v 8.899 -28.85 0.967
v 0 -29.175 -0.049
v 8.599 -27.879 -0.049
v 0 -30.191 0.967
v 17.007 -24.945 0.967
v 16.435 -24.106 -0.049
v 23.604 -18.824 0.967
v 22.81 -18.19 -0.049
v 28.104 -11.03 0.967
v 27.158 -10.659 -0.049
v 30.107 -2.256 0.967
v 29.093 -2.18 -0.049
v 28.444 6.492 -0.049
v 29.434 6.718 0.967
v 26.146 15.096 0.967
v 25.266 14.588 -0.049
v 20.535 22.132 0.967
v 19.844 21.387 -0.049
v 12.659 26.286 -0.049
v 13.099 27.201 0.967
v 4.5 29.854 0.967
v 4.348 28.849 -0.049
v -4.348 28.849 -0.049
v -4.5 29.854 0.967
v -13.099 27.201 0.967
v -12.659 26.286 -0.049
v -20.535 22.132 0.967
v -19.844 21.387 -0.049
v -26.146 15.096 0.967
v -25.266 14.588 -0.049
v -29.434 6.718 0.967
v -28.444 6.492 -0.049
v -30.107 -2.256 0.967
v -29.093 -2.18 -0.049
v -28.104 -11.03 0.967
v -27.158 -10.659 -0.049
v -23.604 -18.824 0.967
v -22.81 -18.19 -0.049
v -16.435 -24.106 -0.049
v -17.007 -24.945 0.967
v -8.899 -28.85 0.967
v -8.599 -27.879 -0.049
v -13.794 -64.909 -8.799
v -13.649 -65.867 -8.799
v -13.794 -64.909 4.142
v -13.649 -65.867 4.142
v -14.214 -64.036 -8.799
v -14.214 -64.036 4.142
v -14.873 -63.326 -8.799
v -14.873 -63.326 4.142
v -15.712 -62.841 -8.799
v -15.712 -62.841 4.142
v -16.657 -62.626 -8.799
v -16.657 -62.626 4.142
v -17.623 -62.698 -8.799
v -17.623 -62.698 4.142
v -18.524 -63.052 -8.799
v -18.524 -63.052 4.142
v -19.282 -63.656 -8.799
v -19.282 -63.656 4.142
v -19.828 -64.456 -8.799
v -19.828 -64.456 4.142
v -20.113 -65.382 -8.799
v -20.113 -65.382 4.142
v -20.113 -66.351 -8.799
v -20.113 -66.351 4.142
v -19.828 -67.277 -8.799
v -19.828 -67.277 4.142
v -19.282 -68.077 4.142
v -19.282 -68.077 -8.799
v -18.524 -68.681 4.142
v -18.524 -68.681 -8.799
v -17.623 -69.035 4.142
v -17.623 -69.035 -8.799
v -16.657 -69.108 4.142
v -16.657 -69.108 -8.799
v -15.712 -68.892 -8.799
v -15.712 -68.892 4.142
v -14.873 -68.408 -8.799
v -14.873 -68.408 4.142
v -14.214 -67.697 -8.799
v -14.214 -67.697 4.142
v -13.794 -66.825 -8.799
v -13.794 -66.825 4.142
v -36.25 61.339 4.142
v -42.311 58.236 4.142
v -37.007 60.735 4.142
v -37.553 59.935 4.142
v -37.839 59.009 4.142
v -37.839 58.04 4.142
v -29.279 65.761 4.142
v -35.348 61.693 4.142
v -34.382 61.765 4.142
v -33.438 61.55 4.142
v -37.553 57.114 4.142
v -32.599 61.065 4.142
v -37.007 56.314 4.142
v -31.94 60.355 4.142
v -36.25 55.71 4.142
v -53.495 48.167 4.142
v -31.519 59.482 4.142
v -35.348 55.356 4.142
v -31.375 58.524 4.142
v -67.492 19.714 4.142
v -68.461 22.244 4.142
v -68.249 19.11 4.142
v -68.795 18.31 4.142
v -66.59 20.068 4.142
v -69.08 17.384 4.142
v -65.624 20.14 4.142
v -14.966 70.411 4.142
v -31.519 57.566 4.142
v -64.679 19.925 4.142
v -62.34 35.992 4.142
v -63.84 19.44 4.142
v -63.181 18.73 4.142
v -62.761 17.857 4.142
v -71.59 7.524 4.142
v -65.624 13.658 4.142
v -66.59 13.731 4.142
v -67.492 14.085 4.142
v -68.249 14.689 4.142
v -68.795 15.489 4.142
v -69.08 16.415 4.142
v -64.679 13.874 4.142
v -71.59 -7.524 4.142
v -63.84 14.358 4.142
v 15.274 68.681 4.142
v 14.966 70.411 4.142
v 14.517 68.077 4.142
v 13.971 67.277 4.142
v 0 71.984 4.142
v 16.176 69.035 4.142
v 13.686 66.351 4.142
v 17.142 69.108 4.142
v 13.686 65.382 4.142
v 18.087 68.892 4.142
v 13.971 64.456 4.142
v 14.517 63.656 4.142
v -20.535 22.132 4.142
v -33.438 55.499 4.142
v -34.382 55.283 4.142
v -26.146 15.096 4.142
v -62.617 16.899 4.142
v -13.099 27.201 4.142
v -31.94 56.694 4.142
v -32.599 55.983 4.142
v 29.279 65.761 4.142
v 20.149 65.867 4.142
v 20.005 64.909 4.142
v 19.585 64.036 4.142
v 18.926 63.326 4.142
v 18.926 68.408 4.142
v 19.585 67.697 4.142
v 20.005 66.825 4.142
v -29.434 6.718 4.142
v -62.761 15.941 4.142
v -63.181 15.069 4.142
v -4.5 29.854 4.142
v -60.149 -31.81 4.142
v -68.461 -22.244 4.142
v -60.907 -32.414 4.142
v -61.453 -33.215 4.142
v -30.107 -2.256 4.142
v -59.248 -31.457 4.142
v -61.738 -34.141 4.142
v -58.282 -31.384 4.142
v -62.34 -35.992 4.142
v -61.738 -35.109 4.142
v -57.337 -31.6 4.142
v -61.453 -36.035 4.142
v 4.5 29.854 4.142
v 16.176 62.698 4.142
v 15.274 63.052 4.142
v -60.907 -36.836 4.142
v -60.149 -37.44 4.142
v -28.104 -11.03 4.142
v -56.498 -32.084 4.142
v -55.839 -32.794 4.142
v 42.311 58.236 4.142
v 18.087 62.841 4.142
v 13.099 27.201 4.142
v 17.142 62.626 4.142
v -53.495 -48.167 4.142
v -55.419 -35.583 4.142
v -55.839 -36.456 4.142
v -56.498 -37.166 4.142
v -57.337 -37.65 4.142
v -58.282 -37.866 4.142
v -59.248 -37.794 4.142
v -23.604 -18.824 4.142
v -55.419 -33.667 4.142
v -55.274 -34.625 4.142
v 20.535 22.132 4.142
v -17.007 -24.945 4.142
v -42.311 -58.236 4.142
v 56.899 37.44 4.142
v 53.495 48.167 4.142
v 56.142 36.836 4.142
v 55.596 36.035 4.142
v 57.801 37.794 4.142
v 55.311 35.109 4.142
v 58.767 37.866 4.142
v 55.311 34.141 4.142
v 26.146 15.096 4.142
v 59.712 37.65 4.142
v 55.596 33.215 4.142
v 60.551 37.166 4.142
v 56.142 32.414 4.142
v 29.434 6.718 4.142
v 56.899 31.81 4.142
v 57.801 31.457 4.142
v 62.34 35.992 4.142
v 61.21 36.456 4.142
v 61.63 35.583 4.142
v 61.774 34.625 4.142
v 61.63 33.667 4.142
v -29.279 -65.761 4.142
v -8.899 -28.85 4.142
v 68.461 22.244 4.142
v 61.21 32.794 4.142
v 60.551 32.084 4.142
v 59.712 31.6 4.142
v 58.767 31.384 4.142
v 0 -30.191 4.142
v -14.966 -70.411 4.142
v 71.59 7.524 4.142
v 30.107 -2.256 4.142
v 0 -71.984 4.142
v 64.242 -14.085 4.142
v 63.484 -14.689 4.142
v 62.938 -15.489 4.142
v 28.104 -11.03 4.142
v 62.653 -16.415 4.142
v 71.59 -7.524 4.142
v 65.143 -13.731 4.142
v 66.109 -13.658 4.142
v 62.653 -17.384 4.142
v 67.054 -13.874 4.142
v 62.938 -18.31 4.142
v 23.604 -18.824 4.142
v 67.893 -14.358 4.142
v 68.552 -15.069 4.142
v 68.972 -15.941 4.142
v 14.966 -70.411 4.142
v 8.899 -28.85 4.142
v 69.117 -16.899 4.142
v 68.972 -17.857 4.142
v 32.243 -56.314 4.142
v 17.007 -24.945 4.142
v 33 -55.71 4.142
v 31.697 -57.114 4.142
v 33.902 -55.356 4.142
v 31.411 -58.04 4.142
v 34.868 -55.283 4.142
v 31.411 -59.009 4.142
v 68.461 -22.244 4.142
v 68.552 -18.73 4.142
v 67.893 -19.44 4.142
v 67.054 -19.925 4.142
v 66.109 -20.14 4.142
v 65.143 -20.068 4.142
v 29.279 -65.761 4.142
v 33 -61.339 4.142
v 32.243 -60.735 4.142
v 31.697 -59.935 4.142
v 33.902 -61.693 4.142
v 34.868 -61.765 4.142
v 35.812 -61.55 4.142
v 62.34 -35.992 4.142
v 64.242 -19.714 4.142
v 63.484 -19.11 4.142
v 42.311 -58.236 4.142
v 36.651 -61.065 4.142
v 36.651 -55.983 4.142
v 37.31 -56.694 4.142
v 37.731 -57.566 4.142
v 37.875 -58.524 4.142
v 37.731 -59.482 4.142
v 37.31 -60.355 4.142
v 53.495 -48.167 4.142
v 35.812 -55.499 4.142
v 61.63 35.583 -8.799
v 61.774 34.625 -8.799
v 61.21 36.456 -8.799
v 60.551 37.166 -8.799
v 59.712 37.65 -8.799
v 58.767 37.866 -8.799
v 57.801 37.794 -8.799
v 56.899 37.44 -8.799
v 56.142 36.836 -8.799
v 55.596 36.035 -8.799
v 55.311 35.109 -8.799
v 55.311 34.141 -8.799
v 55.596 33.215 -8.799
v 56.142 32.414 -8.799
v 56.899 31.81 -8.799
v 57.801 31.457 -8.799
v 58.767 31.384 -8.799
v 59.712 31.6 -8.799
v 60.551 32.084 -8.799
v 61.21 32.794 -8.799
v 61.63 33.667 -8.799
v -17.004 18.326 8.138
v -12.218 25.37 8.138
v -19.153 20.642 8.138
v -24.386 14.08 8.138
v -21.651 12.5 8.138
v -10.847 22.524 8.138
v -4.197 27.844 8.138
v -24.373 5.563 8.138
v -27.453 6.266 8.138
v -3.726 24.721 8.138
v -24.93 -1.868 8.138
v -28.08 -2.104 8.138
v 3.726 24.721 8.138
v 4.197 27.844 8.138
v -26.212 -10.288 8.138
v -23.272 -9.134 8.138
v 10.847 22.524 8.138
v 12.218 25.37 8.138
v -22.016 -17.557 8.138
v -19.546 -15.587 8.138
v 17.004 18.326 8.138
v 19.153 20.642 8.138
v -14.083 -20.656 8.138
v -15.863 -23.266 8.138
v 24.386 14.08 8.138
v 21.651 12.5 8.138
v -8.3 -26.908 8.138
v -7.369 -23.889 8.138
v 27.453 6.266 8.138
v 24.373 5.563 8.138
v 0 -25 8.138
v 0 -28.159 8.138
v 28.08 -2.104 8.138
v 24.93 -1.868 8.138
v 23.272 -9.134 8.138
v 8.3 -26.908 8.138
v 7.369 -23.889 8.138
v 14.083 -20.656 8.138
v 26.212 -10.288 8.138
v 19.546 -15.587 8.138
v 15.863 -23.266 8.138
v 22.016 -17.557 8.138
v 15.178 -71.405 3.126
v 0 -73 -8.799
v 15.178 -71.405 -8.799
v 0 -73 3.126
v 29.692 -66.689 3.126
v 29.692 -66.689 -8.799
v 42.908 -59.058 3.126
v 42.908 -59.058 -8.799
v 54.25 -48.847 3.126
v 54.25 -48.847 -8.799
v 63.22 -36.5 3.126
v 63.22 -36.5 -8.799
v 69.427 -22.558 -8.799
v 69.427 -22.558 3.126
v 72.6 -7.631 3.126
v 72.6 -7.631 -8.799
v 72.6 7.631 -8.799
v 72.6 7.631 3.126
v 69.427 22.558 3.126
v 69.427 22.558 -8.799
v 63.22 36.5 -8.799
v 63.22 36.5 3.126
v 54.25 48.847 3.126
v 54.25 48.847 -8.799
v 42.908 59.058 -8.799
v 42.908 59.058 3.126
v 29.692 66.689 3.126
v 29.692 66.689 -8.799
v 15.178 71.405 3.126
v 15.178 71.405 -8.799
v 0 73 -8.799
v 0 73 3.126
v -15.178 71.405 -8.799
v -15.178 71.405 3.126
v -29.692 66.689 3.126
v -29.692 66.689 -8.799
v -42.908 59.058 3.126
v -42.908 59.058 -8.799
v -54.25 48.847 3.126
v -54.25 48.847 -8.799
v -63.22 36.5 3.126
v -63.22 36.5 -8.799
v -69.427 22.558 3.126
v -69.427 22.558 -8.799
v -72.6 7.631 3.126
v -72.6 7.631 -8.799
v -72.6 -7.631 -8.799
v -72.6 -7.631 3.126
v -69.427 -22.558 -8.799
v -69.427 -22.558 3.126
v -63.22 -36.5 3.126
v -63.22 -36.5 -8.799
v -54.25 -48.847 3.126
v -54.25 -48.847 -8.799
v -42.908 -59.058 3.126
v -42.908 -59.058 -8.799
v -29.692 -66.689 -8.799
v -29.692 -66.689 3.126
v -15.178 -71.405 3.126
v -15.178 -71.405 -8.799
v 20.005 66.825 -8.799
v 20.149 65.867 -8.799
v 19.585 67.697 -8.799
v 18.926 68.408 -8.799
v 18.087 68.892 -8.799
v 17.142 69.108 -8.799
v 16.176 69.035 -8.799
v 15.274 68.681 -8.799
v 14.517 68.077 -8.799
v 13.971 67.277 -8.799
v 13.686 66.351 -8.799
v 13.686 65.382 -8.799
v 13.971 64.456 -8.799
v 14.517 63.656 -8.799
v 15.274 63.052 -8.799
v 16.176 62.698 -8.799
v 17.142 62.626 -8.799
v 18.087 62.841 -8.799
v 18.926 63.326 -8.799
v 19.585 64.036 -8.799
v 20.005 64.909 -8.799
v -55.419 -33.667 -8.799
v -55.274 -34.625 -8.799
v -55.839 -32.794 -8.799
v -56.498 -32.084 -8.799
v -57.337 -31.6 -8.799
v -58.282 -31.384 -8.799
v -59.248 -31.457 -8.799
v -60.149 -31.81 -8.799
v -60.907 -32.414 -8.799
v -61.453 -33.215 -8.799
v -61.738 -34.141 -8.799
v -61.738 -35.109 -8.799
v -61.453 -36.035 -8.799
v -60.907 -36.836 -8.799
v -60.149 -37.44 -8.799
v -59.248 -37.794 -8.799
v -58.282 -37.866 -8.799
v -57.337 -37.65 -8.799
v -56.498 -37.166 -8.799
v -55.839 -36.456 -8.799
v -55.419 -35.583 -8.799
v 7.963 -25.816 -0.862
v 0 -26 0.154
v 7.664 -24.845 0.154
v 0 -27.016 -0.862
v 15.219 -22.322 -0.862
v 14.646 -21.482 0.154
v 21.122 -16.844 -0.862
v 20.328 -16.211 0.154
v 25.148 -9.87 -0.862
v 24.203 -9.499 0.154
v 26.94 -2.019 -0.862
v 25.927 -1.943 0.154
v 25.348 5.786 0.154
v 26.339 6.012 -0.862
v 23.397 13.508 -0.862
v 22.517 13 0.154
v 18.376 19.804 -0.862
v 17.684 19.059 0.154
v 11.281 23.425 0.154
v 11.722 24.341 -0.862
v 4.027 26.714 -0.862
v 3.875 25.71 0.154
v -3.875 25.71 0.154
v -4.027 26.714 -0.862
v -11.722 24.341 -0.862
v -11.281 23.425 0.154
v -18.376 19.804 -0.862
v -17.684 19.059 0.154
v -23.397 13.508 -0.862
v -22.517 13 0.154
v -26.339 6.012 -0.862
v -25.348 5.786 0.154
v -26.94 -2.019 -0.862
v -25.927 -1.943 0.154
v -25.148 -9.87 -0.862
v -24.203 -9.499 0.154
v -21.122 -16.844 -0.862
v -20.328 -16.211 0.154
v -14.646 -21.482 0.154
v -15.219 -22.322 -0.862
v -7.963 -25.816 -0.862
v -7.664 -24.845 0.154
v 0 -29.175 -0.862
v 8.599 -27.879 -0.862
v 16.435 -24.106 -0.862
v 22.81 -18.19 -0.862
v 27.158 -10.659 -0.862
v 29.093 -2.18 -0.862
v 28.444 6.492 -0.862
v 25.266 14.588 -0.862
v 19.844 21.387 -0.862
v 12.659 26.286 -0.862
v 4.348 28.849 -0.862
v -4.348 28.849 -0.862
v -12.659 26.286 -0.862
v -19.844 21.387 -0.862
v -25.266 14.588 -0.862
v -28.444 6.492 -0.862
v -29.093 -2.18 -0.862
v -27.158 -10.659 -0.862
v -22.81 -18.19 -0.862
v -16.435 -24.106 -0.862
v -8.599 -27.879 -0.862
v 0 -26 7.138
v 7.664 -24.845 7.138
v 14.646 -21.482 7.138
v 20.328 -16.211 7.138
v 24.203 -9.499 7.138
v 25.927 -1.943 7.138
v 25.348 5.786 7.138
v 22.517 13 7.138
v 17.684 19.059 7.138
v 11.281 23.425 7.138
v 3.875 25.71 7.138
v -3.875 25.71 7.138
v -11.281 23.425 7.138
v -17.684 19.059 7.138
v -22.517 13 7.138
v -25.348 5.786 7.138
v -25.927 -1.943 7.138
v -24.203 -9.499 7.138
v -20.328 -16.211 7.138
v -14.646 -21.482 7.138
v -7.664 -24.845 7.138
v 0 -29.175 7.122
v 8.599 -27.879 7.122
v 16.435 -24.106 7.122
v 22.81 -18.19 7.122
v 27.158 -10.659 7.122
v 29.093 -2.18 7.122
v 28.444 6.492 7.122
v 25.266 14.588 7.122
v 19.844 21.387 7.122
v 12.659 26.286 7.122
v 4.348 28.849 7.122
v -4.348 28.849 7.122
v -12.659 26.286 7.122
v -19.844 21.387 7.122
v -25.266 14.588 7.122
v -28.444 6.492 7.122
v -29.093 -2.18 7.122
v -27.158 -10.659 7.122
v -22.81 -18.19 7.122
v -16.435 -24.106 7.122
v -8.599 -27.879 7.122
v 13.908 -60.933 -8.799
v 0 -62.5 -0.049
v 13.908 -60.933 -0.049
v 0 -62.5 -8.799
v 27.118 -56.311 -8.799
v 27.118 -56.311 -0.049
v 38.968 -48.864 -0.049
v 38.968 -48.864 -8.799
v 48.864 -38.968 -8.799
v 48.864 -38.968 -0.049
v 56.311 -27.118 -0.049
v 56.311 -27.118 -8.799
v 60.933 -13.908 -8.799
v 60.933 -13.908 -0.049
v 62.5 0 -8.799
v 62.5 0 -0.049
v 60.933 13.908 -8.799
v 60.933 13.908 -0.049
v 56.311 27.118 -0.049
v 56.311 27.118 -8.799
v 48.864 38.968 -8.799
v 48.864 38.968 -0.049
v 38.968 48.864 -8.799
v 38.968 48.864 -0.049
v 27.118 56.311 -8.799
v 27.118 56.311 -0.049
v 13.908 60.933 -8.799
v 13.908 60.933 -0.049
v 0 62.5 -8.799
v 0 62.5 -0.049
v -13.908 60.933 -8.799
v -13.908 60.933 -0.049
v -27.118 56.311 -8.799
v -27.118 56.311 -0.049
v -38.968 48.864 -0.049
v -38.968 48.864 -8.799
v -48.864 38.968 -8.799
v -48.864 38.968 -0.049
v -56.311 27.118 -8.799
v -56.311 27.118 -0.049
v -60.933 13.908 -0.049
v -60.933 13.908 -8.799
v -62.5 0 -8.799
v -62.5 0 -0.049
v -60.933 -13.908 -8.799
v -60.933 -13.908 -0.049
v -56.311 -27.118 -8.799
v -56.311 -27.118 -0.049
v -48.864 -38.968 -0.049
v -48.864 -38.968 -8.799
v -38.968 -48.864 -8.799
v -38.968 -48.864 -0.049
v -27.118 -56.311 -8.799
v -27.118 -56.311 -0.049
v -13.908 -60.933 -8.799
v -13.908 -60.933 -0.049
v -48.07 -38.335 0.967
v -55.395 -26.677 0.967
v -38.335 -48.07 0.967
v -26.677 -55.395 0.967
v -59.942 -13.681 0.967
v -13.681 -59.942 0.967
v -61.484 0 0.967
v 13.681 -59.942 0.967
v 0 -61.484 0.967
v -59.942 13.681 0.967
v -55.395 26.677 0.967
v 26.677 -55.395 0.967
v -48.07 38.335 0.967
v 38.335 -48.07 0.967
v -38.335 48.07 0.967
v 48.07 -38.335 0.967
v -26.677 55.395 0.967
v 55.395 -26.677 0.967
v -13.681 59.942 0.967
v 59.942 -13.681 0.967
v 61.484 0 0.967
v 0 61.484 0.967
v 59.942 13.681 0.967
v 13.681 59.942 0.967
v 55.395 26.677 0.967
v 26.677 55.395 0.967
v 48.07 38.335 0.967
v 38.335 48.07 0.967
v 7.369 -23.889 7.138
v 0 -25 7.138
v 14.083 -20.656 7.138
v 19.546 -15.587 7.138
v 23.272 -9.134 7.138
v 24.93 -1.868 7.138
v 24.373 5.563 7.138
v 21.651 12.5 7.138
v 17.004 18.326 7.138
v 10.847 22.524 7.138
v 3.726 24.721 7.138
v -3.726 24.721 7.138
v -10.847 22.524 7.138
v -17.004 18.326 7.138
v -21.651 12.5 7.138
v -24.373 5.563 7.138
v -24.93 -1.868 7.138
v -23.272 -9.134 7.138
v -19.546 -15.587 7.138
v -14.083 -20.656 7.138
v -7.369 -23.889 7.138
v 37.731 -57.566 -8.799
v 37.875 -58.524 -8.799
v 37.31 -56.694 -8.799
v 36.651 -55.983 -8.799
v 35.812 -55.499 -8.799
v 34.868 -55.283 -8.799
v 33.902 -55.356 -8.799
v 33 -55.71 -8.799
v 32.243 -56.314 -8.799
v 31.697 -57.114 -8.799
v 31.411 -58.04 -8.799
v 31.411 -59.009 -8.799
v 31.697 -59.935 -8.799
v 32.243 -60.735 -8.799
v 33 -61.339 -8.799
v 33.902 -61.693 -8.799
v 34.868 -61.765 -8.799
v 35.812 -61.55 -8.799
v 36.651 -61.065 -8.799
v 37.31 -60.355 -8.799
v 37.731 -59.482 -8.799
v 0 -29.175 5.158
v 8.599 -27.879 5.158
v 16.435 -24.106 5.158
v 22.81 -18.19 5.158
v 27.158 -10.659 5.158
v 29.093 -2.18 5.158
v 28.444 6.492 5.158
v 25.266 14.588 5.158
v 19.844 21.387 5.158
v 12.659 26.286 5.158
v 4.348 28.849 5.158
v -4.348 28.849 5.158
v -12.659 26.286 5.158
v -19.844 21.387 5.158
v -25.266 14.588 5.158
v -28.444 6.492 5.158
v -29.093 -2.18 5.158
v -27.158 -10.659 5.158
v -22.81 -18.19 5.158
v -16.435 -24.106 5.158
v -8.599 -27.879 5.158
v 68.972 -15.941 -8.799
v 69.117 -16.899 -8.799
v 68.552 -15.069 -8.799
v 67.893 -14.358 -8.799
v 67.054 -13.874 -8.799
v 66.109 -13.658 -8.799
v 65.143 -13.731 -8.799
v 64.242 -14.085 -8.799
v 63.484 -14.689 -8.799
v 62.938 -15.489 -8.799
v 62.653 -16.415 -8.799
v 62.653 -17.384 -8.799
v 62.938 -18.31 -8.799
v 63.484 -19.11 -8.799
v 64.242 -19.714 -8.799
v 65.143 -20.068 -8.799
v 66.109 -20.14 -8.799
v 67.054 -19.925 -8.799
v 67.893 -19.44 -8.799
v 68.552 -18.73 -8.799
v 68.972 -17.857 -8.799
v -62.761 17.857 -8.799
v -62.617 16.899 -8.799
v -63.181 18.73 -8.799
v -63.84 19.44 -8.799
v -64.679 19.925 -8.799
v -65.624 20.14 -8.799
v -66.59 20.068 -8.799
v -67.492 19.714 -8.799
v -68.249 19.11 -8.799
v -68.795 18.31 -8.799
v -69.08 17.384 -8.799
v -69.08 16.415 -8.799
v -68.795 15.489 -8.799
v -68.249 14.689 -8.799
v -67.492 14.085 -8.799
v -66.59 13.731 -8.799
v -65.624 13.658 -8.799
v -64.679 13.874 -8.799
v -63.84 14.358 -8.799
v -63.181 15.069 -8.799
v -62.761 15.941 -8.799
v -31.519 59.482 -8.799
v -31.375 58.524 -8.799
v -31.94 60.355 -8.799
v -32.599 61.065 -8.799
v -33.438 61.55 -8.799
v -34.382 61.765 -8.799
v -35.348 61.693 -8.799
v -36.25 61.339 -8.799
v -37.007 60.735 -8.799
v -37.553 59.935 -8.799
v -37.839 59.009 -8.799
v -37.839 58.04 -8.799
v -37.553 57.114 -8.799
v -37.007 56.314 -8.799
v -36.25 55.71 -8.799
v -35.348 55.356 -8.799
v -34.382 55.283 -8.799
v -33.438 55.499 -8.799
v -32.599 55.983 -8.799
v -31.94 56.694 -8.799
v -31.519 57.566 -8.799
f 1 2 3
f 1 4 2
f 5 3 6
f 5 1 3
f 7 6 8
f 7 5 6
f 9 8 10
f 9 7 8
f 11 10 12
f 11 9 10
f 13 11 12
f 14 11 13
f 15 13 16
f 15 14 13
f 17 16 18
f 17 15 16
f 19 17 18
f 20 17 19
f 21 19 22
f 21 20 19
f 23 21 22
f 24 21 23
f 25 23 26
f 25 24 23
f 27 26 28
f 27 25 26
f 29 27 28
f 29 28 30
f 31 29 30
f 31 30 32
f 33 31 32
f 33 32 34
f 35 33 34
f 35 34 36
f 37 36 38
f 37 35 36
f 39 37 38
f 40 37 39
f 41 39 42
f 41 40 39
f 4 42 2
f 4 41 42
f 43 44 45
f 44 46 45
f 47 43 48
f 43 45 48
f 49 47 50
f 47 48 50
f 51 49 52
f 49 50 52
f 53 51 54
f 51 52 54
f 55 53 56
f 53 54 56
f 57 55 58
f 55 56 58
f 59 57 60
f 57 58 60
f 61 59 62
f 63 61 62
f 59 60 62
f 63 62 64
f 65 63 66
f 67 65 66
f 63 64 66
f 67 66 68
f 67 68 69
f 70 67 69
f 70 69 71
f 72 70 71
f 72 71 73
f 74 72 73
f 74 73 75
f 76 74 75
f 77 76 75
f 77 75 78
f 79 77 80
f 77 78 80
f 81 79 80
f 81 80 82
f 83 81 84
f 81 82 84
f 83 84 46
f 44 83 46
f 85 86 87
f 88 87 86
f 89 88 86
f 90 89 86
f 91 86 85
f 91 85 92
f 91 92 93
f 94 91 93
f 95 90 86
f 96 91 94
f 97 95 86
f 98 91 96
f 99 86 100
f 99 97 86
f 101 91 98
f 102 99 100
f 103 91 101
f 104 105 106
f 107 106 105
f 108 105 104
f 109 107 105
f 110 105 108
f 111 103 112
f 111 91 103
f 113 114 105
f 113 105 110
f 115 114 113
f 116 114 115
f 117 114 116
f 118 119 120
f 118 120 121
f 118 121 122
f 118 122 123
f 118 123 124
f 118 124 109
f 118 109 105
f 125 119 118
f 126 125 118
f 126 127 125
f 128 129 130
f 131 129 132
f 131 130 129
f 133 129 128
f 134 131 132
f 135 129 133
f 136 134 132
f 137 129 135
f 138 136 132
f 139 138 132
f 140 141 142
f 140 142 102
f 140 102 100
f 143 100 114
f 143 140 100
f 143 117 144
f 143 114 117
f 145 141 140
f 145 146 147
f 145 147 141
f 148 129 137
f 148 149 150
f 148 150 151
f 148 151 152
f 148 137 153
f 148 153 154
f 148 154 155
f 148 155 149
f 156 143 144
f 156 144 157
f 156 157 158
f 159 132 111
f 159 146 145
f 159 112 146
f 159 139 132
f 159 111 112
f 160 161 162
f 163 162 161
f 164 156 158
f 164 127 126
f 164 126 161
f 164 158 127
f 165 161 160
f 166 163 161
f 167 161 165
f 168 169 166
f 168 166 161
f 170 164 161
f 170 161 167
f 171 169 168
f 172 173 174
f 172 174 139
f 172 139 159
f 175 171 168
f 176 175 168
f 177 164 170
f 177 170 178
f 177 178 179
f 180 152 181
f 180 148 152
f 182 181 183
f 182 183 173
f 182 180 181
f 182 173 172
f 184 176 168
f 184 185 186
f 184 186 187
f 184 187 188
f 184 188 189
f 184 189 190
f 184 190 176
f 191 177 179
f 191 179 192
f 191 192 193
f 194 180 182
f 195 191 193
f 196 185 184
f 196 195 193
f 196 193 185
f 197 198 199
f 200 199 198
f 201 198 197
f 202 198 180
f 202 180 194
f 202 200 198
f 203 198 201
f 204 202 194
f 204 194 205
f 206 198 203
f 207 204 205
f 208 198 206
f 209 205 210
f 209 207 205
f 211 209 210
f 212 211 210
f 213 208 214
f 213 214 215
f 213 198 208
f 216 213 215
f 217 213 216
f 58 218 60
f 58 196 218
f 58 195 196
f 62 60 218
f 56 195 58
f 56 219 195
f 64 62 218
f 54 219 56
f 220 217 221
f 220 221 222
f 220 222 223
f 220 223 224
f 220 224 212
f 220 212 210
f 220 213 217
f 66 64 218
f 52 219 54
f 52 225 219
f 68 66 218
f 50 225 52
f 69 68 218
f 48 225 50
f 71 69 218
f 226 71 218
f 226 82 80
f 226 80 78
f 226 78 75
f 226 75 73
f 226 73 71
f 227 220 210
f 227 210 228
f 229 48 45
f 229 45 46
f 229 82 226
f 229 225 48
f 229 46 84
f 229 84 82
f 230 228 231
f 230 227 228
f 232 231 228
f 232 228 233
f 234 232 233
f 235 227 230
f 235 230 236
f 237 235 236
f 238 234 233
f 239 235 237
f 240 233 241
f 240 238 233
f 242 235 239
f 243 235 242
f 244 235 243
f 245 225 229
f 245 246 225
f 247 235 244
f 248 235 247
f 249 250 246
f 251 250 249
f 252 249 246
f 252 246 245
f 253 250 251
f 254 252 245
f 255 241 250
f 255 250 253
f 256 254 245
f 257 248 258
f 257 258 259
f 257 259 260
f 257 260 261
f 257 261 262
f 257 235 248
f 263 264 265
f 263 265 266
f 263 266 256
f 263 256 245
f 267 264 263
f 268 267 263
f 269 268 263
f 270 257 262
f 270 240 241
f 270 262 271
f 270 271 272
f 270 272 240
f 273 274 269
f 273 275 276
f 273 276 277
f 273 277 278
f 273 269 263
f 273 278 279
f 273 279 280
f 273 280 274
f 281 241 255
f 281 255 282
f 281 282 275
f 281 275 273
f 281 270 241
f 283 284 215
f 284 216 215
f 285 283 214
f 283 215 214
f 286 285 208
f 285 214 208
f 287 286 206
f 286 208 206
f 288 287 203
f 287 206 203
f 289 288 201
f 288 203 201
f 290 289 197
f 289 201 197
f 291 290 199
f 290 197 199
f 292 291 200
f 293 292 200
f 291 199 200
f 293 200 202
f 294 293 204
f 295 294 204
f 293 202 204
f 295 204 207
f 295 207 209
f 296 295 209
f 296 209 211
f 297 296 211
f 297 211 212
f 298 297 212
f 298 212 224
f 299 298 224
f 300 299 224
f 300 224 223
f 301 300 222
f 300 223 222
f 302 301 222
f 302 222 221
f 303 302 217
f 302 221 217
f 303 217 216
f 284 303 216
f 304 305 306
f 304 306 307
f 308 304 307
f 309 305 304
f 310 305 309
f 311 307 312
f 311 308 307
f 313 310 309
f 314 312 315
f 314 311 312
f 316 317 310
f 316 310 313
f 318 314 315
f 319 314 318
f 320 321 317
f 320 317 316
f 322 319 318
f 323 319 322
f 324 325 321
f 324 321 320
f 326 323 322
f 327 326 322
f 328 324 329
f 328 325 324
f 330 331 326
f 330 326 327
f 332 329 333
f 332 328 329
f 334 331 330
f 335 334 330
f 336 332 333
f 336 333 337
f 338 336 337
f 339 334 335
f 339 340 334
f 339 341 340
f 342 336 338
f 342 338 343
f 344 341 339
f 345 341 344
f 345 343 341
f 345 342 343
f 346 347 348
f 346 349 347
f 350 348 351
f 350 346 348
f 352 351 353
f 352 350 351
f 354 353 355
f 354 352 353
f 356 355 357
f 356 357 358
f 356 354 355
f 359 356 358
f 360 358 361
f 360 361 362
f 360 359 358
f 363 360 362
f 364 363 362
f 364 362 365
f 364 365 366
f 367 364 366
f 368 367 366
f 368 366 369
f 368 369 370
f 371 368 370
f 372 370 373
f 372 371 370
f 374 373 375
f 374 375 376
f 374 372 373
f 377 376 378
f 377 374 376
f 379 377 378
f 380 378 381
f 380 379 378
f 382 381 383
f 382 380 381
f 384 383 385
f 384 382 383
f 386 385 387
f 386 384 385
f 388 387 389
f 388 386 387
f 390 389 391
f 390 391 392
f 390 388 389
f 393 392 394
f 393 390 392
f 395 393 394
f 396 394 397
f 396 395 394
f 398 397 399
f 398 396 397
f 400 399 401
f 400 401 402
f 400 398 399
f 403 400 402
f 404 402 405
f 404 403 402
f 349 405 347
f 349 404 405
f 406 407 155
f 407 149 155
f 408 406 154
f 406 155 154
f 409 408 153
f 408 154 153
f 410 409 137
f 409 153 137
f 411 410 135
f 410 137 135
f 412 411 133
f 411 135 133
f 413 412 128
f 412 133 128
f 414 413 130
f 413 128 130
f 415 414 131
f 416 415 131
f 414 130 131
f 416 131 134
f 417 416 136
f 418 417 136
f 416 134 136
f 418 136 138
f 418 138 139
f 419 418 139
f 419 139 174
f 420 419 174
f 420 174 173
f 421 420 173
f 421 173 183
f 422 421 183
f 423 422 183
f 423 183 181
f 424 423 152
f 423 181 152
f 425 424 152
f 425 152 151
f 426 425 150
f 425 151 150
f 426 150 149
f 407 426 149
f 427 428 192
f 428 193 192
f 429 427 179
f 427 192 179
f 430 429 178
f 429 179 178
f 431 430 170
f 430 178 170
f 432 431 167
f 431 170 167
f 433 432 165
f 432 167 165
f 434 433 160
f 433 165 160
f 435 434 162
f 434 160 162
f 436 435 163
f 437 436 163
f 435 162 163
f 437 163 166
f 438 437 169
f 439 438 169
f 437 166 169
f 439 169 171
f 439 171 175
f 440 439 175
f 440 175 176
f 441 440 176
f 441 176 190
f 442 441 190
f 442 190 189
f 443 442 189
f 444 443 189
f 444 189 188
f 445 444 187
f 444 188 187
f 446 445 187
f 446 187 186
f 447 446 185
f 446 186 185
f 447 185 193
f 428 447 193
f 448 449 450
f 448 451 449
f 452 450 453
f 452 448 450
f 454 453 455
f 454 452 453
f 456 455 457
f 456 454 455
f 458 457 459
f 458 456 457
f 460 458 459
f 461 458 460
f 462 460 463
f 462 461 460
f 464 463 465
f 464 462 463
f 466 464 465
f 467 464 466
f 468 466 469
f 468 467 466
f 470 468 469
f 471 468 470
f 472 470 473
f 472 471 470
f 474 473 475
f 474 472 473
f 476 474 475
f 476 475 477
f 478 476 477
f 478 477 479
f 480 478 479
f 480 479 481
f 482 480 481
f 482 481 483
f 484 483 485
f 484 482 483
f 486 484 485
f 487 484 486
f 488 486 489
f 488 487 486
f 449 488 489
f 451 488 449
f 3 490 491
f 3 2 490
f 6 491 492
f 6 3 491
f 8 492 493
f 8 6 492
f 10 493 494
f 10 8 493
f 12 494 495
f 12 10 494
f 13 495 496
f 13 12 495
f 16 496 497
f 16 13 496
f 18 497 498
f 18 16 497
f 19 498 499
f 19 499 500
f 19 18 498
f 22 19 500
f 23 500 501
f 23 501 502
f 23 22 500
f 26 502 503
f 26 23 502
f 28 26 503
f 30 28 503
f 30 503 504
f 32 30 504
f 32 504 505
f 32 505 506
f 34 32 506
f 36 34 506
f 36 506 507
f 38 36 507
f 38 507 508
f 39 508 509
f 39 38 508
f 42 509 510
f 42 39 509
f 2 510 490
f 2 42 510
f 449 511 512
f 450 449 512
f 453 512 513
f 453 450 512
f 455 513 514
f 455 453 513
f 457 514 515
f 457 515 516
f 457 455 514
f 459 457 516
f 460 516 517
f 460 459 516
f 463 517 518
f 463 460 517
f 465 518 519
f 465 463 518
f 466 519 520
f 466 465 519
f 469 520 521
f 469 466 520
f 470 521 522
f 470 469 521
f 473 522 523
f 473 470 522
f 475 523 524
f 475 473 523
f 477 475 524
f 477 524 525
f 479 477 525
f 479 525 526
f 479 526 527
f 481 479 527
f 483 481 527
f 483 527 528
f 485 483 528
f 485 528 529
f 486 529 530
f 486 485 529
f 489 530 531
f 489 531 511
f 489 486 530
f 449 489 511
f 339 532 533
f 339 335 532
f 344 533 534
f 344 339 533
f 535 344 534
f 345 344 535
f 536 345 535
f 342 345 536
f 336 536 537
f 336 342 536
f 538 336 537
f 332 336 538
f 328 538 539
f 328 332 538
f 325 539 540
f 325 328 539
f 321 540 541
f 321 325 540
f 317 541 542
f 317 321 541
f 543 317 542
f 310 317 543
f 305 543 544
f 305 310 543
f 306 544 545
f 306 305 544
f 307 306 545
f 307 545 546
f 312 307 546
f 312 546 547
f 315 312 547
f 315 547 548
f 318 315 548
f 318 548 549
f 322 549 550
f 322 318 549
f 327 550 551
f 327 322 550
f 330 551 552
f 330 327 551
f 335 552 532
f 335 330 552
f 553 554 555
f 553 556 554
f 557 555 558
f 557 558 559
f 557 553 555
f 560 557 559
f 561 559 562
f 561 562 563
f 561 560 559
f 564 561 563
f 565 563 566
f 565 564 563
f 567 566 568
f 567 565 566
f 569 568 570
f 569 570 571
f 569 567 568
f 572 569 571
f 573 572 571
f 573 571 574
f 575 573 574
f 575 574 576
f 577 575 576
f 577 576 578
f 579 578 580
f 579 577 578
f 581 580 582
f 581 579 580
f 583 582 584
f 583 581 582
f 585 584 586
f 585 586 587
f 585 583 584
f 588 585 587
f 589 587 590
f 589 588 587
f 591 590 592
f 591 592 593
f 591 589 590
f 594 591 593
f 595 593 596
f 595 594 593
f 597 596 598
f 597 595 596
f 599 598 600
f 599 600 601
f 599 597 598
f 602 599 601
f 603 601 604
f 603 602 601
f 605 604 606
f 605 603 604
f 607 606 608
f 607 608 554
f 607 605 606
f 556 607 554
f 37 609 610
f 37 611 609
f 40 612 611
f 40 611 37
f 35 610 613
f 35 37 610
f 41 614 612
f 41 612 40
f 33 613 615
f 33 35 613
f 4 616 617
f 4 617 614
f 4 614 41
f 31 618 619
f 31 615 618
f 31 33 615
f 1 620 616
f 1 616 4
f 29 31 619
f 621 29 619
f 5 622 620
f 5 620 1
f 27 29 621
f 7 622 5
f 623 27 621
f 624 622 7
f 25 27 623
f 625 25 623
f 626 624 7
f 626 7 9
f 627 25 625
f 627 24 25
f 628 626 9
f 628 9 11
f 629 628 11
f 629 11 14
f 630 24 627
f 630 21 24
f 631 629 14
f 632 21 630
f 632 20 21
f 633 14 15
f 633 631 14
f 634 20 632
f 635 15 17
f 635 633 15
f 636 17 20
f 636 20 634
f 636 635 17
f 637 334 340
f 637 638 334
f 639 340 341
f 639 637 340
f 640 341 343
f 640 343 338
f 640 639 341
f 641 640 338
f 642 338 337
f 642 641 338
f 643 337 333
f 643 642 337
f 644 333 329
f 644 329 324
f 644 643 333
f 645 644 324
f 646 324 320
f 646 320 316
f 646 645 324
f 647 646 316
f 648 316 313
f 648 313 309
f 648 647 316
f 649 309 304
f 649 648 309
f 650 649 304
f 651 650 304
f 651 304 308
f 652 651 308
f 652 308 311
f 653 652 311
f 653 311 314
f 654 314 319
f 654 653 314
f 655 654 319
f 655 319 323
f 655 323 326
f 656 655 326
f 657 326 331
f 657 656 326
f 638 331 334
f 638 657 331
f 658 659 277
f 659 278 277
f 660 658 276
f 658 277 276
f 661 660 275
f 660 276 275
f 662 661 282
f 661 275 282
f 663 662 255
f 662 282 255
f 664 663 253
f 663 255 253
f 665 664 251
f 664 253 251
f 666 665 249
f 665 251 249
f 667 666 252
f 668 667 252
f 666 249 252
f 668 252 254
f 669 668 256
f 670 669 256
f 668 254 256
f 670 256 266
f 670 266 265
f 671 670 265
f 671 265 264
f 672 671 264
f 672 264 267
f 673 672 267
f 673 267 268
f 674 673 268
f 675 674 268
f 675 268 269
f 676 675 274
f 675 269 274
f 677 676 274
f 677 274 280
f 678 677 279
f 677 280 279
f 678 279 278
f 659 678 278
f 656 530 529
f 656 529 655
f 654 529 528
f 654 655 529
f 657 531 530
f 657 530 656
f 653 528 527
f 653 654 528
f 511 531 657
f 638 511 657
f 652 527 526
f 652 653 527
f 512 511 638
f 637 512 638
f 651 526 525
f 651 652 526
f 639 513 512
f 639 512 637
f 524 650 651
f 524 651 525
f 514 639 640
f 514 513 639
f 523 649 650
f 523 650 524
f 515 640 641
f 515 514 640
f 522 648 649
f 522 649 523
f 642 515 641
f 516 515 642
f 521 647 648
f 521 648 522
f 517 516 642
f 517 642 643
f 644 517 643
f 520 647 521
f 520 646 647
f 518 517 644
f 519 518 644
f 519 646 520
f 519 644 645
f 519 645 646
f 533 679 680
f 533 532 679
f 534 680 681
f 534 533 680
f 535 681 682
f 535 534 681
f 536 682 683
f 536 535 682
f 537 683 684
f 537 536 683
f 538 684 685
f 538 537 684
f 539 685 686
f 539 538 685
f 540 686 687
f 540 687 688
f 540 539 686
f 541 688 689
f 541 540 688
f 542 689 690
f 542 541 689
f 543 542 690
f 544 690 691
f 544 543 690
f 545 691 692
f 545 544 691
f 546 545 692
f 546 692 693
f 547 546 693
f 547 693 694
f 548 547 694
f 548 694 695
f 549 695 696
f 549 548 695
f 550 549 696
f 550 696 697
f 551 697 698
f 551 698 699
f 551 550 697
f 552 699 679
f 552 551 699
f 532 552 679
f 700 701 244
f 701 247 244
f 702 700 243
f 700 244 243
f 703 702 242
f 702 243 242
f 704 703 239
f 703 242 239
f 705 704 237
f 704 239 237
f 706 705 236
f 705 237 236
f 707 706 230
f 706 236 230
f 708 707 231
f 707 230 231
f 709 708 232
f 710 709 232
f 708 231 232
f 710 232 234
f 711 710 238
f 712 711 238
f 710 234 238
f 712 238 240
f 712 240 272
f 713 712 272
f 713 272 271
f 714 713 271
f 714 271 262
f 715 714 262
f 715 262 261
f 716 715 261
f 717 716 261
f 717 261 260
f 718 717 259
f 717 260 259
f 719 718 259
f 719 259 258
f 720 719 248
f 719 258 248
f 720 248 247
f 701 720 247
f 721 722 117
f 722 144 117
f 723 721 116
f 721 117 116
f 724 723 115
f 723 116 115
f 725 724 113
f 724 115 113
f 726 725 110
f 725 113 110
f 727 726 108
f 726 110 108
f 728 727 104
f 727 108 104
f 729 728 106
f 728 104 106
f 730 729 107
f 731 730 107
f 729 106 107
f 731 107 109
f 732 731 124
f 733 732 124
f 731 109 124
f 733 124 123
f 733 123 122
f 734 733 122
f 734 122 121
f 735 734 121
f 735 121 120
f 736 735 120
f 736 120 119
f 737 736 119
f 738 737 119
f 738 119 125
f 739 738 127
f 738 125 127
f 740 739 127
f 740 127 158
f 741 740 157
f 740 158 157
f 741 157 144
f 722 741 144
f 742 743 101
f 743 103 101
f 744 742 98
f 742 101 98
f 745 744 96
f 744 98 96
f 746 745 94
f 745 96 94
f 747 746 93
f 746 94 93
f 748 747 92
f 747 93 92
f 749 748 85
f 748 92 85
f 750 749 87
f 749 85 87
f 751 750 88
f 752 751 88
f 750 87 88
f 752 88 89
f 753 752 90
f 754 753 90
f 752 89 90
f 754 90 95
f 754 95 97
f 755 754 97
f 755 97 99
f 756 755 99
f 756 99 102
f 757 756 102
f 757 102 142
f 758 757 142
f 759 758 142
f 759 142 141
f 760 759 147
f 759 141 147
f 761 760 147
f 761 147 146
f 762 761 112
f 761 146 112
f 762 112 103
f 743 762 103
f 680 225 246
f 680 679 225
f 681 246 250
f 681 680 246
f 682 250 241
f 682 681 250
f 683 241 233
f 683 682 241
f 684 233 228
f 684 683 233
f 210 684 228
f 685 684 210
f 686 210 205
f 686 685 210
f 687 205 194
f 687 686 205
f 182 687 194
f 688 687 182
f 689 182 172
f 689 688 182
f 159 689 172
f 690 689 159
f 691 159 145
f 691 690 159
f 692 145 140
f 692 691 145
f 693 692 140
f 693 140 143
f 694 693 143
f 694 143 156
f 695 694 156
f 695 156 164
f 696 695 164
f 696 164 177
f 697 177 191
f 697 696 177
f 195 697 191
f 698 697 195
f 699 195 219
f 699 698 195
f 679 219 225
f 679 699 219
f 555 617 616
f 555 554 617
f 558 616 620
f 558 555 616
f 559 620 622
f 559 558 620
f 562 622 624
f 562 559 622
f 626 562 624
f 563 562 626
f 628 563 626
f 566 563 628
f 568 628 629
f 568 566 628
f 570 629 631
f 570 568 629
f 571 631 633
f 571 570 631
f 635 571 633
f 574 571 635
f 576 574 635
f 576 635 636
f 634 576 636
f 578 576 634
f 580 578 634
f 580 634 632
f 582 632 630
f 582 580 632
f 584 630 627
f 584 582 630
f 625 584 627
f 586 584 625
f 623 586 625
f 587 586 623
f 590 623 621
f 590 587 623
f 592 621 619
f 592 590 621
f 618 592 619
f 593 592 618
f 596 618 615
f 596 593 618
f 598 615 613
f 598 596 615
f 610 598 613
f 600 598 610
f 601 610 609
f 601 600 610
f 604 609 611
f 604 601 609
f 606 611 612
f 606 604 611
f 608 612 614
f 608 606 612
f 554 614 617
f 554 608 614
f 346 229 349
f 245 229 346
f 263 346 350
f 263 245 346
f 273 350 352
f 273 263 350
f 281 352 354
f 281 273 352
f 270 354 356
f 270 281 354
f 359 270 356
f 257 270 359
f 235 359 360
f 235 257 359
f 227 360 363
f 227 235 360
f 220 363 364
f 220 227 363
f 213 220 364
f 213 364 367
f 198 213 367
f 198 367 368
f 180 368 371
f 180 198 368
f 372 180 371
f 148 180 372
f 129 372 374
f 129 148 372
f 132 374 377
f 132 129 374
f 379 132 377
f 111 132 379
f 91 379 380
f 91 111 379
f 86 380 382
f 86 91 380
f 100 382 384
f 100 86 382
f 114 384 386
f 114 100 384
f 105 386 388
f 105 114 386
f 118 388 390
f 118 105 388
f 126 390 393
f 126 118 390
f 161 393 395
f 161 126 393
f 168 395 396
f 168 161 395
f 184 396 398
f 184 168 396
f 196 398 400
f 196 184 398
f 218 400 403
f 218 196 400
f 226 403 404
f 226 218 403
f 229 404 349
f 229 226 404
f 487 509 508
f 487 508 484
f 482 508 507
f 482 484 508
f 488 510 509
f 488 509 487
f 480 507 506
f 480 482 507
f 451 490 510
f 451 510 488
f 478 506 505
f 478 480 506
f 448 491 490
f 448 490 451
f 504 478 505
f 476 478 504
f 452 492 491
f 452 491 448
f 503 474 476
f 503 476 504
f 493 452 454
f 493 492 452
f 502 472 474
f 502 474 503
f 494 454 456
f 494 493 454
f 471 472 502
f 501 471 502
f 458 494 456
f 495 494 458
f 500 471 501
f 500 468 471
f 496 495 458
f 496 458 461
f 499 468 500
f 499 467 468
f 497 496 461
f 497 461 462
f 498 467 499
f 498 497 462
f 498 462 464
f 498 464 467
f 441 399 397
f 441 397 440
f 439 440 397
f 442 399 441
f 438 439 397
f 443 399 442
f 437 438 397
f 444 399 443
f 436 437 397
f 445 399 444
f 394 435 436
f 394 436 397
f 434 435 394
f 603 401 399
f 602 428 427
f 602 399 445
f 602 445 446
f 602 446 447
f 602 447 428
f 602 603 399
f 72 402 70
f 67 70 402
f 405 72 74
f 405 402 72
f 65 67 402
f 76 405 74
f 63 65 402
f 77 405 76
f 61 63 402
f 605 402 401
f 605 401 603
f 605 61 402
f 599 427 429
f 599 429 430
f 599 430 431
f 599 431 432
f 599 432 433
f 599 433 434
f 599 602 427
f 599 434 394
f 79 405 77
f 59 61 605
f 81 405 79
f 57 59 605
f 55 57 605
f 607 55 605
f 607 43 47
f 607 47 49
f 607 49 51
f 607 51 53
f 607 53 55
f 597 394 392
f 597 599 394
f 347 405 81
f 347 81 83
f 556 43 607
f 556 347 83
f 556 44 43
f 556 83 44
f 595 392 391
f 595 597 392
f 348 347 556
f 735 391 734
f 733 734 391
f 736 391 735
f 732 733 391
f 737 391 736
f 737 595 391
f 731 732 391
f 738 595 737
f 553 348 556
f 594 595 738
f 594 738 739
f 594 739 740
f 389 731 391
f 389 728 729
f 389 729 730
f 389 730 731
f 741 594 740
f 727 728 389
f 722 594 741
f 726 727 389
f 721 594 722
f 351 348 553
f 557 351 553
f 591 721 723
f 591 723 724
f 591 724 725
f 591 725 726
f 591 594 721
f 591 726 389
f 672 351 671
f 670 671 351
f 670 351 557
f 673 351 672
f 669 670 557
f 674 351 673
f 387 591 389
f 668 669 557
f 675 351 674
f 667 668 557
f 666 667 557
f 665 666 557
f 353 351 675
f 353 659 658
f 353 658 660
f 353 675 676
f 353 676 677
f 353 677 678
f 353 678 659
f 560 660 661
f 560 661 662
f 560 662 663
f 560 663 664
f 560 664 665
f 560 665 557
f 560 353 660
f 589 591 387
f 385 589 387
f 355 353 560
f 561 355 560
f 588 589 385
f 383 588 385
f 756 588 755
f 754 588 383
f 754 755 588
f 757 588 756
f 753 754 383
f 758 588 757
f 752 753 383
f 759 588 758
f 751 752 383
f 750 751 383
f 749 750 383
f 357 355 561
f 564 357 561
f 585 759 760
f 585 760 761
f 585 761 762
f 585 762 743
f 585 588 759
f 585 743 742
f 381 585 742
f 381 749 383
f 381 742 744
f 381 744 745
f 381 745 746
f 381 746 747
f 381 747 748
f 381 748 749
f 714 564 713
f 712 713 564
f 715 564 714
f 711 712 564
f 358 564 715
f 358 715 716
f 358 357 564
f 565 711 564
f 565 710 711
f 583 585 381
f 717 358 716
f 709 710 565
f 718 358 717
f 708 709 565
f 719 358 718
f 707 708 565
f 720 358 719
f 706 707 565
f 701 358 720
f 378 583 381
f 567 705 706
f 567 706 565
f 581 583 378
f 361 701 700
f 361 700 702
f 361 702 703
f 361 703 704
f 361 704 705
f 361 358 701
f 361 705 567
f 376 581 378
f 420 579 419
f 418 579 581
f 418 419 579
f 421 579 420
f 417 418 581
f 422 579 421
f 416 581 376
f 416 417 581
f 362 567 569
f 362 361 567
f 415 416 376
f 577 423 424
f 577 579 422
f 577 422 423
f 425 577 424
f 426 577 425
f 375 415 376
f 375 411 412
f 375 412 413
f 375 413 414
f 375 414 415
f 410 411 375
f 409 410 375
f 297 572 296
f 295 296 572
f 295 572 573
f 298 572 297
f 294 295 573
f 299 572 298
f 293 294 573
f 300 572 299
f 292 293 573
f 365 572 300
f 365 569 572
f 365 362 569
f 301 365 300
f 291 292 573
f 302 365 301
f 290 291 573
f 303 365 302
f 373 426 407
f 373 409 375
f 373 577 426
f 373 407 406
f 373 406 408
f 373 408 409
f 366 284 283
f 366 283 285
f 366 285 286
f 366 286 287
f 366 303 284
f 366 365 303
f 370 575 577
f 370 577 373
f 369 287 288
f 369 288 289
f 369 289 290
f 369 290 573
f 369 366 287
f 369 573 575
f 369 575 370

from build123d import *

# Parameters (mm, degrees)
SKETCH2_R               = 3.25
CUT_EXTRUDE1_DEPTH      = 9.138277453
CUT_EXTRUDE1_DEPTH_BACK = 9.799222547


with BuildPart() as part:
    # Sketch1 → Revolve1 (revolve)
    with BuildSketch(Plane(origin=(0, 0, 0), x_dir=(0, 0, -1), z_dir=(1, 0, 0))):
        Polygon((0.861722547, -29.175), (0.048922547, -29.175), (-0.967077453, -30.191), (-0.967077453, -61.484), (0.048922547, -62.5), (8.799222547, -62.5), (8.799222547, -73), (-3.126077453, -73), (-4.142077453, -71.984), (-4.142077453, -30.191), (-5.158077453, -29.175), (-7.122277453, -29.175), (-8.138277453, -28.159), (-8.138277453, -25), (-7.138277453, -25), (-7.138277453, -26), (-0.154277453, -26), (0.861722547, -27.016), align=None)
    revolve(axis=Axis((0, 0, 0), (0, 0, 1)))

    # Sketch2 → Cut-Extrude1 (cut, two sides)
    with BuildSketch(Plane.XY) as cut_extrude1_sk:
        with Locations((-58.52440797, -34.625043996)):
            Circle(SKETCH2_R)
        with Locations((-65.866609149, 16.899402332)):
            Circle(SKETCH2_R)
        with Locations((-34.625043996, 58.52440797)):
            Circle(SKETCH2_R)
        with Locations((16.899402332, 65.866609149)):
            Circle(SKETCH2_R)
        with Locations((58.52440797, 34.625043996)):
            Circle(SKETCH2_R)
        with Locations((65.866609149, -16.899402332)):
            Circle(SKETCH2_R)
        with Locations((34.625043996, -58.52440797)):
            Circle(SKETCH2_R)
        with Locations((-16.899402332, -65.866609149)):
            Circle(SKETCH2_R)
    extrude(amount=CUT_EXTRUDE1_DEPTH, mode=Mode.SUBTRACT)
    extrude(cut_extrude1_sk.sketch, amount=-CUT_EXTRUDE1_DEPTH_BACK, mode=Mode.SUBTRACT)


solid = part.part
